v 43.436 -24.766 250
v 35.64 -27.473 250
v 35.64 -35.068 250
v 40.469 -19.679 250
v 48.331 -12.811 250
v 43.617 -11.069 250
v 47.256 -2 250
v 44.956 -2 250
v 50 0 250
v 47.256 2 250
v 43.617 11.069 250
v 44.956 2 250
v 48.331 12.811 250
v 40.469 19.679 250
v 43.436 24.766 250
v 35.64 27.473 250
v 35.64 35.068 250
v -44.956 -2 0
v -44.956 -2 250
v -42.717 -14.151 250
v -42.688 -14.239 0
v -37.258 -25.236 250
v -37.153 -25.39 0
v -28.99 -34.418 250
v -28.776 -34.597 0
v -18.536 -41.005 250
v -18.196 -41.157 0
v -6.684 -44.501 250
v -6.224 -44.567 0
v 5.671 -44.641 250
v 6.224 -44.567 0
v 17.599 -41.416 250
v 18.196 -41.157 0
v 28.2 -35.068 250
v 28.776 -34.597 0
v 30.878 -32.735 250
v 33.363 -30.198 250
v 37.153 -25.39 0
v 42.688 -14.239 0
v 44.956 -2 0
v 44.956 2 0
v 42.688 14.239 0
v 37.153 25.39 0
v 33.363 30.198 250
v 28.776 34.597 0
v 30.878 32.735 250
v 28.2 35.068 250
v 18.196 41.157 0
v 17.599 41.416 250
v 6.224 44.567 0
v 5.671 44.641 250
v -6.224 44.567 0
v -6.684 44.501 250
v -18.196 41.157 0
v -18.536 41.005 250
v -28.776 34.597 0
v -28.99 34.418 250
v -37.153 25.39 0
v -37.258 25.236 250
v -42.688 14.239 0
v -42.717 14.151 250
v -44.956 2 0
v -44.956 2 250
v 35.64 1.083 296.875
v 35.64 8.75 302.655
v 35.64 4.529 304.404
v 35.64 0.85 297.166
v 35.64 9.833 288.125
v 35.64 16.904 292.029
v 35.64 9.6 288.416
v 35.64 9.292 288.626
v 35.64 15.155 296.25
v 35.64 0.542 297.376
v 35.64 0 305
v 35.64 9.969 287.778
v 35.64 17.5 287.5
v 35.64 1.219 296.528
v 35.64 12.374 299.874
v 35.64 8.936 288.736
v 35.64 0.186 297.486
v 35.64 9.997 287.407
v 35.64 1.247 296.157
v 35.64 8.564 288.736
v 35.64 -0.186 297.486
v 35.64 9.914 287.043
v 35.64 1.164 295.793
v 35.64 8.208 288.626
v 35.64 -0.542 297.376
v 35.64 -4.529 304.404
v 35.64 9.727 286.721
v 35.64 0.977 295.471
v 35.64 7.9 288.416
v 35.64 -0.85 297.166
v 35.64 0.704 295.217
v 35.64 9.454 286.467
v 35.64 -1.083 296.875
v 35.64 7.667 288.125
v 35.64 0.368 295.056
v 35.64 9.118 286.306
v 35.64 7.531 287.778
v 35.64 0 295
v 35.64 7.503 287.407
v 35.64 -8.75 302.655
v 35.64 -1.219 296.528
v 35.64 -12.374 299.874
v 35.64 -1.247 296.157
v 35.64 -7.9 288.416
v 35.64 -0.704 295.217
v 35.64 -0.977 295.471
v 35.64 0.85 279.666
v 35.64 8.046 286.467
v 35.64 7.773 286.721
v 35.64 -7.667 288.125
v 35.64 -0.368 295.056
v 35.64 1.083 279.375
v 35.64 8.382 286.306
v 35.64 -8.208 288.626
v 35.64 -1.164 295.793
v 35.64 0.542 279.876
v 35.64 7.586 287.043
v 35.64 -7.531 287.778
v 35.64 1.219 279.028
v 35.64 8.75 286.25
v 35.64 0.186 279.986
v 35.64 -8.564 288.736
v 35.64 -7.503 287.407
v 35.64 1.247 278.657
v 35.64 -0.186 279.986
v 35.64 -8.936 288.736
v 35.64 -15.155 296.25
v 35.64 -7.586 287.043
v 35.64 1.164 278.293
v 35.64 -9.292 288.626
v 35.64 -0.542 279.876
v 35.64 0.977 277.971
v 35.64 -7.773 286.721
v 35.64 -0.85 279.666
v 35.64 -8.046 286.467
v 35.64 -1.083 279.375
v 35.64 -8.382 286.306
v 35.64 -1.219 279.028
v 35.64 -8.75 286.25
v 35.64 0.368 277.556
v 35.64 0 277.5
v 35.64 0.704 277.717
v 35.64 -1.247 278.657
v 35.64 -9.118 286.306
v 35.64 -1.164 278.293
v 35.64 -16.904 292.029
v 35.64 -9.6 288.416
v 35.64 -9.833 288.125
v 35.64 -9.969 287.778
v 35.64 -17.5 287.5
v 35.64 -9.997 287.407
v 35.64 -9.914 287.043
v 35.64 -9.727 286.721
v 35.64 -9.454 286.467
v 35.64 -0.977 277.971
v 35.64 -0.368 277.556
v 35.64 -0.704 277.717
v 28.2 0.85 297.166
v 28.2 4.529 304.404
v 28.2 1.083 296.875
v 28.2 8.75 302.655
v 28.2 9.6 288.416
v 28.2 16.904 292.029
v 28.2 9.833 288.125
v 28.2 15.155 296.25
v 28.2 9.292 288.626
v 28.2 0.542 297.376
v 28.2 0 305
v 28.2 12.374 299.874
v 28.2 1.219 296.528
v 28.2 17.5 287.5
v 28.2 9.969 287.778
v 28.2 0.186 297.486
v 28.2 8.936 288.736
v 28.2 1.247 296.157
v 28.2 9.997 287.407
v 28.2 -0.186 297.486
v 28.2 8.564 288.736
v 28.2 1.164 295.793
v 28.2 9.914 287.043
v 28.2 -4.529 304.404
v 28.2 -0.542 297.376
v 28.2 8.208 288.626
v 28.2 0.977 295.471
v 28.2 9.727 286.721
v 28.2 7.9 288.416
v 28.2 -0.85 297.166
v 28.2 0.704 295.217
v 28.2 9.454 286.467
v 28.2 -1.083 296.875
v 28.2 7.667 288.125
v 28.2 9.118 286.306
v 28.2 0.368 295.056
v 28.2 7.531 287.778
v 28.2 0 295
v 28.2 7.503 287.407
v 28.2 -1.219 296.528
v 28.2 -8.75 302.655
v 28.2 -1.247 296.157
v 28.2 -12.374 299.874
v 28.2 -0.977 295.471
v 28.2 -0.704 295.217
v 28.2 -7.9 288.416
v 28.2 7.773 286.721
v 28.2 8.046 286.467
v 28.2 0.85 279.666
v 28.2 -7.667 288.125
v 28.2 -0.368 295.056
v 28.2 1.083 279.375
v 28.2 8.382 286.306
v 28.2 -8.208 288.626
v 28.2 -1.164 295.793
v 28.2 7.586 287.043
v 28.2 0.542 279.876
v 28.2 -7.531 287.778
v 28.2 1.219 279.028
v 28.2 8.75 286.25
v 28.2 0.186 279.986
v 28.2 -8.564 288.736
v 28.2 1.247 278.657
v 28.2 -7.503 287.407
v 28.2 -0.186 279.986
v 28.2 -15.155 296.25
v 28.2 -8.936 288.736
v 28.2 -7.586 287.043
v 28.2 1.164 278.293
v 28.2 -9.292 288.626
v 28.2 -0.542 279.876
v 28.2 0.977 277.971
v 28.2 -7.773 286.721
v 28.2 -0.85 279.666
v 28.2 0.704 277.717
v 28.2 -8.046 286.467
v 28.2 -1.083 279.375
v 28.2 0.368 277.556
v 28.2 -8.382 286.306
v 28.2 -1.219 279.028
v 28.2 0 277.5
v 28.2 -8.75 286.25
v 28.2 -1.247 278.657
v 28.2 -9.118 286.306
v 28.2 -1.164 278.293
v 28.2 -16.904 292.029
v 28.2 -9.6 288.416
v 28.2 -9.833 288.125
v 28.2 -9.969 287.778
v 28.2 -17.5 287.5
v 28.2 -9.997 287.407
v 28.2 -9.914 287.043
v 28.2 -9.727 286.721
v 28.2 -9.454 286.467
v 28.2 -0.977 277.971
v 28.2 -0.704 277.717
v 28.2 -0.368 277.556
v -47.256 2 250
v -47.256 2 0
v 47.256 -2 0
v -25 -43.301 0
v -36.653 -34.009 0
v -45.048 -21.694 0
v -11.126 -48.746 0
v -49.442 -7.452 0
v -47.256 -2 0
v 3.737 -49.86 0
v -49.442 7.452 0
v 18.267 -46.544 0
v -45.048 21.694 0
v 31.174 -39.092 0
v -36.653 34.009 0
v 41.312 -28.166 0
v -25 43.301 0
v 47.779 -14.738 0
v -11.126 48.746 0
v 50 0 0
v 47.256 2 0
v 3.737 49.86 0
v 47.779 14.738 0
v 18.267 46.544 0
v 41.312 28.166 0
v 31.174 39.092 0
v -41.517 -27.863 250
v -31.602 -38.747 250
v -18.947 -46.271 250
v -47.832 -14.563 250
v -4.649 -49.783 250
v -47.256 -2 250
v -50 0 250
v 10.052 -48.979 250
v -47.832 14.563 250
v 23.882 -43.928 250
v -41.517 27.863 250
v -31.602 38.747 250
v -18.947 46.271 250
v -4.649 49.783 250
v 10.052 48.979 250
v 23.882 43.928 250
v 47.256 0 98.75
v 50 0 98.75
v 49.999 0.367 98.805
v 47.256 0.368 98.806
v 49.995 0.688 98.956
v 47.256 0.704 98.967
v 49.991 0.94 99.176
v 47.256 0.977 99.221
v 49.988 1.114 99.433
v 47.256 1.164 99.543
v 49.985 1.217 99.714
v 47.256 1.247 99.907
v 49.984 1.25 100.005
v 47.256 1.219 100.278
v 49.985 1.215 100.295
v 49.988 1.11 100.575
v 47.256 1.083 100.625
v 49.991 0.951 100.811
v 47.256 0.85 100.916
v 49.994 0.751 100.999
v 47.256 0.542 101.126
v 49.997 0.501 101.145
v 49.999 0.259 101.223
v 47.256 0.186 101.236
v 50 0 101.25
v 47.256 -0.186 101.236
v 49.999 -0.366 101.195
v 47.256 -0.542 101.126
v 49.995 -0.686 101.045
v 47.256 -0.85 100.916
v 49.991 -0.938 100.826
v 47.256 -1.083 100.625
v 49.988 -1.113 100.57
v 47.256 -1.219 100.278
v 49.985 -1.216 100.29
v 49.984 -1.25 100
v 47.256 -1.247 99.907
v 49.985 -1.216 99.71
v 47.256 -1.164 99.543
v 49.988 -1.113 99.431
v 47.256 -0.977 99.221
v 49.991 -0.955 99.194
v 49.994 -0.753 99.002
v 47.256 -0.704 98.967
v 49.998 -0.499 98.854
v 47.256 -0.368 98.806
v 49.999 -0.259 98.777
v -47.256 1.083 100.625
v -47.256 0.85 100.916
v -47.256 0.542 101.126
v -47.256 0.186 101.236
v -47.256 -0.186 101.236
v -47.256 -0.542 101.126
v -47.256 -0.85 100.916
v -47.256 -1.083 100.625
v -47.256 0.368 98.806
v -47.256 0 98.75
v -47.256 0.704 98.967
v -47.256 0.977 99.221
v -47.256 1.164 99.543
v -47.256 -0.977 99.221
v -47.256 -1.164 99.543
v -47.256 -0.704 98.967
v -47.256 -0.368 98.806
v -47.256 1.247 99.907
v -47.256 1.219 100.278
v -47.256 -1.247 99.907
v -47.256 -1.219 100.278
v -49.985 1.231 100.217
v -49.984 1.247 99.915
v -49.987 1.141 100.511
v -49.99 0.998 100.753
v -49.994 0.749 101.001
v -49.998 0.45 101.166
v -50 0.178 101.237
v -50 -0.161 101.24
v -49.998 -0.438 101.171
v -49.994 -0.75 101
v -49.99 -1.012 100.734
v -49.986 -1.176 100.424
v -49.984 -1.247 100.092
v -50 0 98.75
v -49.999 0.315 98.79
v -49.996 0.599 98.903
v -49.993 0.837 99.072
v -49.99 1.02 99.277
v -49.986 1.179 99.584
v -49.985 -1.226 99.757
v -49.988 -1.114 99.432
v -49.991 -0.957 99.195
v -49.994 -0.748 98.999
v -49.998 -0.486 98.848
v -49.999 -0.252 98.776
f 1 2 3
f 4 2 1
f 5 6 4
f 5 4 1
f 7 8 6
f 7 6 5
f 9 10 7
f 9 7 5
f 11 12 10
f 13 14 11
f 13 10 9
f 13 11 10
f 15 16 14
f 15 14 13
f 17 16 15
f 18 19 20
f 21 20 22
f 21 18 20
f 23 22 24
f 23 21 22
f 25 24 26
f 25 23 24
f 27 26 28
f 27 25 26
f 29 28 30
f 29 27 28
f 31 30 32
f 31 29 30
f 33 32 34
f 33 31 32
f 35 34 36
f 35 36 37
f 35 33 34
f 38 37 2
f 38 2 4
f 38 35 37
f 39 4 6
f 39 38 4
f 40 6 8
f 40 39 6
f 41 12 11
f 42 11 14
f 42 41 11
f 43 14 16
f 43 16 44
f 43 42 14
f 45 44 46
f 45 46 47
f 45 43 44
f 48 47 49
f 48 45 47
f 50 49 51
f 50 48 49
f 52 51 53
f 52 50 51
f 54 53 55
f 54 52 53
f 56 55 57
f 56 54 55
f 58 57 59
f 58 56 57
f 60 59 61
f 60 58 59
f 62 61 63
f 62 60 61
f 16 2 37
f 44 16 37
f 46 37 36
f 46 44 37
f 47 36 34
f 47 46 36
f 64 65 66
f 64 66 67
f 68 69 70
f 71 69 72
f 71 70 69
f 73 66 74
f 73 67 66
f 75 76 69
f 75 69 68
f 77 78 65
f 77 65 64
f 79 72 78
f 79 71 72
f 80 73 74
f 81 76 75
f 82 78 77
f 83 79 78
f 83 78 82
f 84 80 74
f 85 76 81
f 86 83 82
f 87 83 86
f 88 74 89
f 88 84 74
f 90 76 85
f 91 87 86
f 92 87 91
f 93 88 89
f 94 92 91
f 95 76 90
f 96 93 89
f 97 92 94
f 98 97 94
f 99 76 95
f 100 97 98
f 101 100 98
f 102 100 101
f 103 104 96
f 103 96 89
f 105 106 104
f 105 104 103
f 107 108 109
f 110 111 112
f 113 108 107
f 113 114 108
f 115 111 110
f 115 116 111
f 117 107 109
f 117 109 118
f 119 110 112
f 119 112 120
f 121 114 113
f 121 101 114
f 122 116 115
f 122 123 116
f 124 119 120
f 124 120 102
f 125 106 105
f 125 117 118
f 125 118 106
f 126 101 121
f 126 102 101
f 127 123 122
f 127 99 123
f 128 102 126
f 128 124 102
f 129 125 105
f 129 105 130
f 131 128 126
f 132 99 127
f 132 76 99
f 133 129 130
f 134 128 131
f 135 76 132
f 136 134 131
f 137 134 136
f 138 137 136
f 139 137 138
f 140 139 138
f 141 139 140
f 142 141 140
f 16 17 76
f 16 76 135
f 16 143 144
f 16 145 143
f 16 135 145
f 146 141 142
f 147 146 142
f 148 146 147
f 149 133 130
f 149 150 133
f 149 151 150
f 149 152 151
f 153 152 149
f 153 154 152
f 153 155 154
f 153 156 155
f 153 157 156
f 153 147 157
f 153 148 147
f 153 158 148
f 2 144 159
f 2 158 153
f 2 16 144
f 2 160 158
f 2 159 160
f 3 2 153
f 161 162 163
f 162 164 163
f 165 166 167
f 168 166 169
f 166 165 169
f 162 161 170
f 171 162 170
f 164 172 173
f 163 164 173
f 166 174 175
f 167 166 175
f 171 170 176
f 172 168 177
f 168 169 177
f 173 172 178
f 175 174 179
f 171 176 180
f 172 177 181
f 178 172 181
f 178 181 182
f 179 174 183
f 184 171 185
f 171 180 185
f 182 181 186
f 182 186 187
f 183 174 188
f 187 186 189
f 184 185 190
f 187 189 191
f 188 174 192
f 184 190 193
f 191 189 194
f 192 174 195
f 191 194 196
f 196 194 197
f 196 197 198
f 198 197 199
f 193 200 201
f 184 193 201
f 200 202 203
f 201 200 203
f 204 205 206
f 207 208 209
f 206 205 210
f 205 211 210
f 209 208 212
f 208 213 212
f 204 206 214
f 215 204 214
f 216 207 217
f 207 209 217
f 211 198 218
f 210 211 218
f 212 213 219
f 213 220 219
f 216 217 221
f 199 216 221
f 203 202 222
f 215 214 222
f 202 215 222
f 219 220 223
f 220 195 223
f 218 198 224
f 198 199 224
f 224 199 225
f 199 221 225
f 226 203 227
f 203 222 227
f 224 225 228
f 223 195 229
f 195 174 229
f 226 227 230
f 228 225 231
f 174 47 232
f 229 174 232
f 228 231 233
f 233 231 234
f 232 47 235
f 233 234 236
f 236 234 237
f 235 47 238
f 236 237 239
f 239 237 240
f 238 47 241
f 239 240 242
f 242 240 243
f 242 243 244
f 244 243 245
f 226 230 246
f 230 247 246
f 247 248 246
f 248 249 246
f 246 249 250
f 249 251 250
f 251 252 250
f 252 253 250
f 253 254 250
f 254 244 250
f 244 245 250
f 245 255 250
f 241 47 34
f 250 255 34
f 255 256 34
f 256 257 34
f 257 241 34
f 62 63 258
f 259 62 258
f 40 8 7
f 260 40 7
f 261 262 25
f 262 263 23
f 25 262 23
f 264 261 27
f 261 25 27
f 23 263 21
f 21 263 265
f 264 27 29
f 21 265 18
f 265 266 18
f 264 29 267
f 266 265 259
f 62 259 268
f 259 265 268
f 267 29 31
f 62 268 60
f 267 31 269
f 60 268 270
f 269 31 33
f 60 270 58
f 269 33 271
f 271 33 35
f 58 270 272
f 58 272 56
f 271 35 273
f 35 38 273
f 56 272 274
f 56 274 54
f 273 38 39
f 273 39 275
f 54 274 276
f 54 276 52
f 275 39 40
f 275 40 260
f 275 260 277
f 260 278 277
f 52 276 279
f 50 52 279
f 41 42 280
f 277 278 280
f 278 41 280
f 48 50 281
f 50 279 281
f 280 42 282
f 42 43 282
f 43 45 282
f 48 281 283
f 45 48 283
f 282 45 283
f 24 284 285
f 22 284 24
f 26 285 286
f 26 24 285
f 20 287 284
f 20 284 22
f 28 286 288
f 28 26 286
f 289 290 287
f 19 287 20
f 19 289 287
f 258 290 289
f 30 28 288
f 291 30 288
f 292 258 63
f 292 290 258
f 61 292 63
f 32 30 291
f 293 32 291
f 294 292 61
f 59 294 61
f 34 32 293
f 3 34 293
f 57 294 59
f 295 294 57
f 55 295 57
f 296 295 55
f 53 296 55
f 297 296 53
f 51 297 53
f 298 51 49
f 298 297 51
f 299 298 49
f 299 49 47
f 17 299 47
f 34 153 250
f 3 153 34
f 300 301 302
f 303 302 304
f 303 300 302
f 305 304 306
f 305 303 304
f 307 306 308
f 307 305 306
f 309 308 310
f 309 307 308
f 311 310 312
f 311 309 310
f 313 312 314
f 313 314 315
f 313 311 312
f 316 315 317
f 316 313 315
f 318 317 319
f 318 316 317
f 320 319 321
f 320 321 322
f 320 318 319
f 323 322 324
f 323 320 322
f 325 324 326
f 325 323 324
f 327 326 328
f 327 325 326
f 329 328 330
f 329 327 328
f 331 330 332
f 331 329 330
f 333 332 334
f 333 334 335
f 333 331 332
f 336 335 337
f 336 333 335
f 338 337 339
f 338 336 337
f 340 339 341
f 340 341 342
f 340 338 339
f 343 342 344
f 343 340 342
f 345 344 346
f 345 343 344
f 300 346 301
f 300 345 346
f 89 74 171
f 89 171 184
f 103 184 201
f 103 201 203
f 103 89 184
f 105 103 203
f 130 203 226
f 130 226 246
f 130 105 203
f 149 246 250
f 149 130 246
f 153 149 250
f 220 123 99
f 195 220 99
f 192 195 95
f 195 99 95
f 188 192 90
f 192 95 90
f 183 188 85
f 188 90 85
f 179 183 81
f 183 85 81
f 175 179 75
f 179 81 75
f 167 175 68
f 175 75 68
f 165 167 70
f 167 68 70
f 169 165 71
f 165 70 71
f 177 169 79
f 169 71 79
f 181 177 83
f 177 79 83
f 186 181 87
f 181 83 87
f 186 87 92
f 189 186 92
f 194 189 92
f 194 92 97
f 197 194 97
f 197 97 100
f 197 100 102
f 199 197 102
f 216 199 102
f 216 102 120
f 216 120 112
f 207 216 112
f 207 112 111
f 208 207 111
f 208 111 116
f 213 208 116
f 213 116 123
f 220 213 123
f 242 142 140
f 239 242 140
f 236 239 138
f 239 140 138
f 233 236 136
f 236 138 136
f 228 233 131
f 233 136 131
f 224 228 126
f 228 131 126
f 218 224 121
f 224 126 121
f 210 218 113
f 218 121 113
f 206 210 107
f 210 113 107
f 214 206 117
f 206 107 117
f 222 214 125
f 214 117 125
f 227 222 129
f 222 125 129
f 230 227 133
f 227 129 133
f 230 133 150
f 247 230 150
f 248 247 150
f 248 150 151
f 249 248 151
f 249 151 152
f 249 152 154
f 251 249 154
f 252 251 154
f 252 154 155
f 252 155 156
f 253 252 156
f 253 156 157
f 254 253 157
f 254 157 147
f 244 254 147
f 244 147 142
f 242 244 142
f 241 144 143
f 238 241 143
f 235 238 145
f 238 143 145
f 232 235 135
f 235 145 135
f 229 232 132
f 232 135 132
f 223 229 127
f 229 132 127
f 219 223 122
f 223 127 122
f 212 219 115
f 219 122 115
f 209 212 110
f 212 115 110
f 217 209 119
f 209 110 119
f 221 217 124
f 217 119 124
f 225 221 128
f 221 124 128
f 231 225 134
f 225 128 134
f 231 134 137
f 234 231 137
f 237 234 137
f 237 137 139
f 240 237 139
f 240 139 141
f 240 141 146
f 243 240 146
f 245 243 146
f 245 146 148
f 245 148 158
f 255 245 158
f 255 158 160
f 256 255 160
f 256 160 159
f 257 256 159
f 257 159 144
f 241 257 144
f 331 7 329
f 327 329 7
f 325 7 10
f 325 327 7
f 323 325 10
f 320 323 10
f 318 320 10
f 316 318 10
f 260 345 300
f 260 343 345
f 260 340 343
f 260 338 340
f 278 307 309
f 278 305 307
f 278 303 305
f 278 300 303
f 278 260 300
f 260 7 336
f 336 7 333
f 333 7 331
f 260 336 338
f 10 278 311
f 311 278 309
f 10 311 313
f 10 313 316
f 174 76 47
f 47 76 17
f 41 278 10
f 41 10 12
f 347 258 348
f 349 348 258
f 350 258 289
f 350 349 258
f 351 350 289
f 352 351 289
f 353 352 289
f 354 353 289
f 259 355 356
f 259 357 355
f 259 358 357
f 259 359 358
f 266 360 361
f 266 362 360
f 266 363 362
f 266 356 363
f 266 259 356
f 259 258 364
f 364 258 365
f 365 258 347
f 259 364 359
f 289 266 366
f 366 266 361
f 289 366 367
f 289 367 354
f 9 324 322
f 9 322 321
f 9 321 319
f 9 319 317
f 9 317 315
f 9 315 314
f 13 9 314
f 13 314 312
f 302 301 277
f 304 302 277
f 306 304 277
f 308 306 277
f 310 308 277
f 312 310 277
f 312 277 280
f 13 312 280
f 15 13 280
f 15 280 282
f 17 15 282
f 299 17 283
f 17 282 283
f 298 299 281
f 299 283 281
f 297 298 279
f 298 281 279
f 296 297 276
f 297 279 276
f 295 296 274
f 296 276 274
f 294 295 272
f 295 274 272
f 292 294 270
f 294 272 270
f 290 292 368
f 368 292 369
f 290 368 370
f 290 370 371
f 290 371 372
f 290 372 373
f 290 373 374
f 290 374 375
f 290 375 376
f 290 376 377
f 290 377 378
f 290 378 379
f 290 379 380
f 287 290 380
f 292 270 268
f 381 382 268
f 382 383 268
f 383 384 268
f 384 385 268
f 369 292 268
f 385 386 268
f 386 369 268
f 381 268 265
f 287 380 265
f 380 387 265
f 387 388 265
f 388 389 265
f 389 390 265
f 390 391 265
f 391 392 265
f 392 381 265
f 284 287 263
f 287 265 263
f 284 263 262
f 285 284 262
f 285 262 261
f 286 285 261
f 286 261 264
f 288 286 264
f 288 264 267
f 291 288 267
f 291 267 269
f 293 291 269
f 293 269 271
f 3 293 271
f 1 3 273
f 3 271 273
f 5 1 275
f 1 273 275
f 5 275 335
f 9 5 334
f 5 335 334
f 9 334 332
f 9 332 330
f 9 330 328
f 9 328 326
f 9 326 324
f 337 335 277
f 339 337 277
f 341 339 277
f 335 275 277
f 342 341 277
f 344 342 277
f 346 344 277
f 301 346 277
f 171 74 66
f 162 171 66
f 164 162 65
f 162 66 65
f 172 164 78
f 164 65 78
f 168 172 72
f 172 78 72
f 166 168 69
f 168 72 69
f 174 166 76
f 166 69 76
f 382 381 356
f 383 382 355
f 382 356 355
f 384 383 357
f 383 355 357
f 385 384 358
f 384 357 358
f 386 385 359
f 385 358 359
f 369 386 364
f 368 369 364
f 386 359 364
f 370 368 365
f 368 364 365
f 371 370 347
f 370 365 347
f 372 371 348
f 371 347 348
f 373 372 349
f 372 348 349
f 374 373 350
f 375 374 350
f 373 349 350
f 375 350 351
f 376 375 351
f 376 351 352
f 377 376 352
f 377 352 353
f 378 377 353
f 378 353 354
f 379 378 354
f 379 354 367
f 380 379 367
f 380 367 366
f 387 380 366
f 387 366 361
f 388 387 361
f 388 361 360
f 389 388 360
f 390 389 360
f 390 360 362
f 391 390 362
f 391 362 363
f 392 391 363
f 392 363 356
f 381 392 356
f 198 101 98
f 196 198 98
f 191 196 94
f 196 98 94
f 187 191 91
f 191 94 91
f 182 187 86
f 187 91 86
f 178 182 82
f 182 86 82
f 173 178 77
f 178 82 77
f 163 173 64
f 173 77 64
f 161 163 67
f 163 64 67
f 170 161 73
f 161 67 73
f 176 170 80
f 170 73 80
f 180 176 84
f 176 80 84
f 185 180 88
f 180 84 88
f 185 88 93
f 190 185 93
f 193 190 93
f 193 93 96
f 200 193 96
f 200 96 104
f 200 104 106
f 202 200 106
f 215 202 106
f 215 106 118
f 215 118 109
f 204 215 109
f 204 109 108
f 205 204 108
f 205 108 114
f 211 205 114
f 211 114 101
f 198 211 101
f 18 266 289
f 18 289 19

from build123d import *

# Parameters (mm, degrees)
SKETCH1_R               = 50
BOSS_EXTRUDE1_DEPTH     = 250
BOSS_EXTRUDE2_DEPTH     = 55
SKETCH7_R               = 1.25
CUT_EXTRUDE4_DEPTH      = 75
CUT_EXTRUDE4_DEPTH_BACK = 96
CUT_EXTRUDE5_DEPTH      = 96
CUT_EXTRUDE6_DEPTH      = 96
SKETCH10_R              = 1.25
CUT_EXTRUDE7_DEPTH      = 96


with BuildPart() as part:
    # Sketch1 → Boss-Extrude1 (new body)
    with BuildSketch(Plane.XY):
        Circle(SKETCH1_R)
        with BuildLine():
            Line((-44.955555556, 1.999506112), (-47.255555556, 1.999506112))
            Line((-47.255555556, 1.999506112), (-47.255555556, -1.999506112))
            Line((-47.255555556, -1.999506112), (-44.955555556, -1.999506112))
            ThreePointArc((-44.955555556, -1.999506112), (0, -45), (44.955555556, -1.999506112))
            Line((44.955555556, -1.999506112), (47.255555556, -1.999506112))
            Line((47.255555556, -1.999506112), (47.255555556, 1.999506112))
            Line((47.255555556, 1.999506112), (44.955555556, 1.999506112))
            ThreePointArc((44.955555556, 1.999506112), (0, 45), (-44.955555556, 1.999506112))
        make_face(mode=Mode.SUBTRACT)
    extrude(amount=BOSS_EXTRUDE1_DEPTH)

    # Sketch3 → Boss-Extrude2 (add)
    with BuildSketch(Plane.XY.offset(250)):
        Polygon((28.2, 0), (28.2, 35.067934071), (35.640426485, 35.067934071), (35.640426485, -35.067934071), (28.2, -35.067934071), align=None)
    extrude(amount=BOSS_EXTRUDE2_DEPTH)

    # Sketch7 → Cut-Extrude4 (cut, two sides)
    with BuildSketch(Plane(origin=(35.640426485, 0, 0), x_dir=(0, 0, -1), z_dir=(1, 0, 0))) as cut_extrude4_sk:
        with Locations((-100, 0)):
            Circle(SKETCH7_R)
    extrude(amount=CUT_EXTRUDE4_DEPTH, mode=Mode.SUBTRACT)
    extrude(cut_extrude4_sk.sketch, amount=-CUT_EXTRUDE4_DEPTH_BACK, mode=Mode.SUBTRACT)

    # Sketch8 → Cut-Extrude5 (cut)
    with BuildSketch(Plane(origin=(35.640426485, 0, 0), x_dir=(0, 0, -1), z_dir=(1, 0, 0))):
        with BuildLine():
            Line((-287.5, 17.5), (-250, 35.067934071))
            Line((-250, 35.067934071), (-305, 35.067934071))
            Line((-305, 35.067934071), (-305, 0))
            ThreePointArc((-305, 0), (-299.874368671, 12.374368671), (-287.5, 17.5))
        make_face()
    extrude(amount=-CUT_EXTRUDE5_DEPTH, mode=Mode.SUBTRACT)

    # Sketch9 → Cut-Extrude6 (cut)
    with BuildSketch(Plane(origin=(35.640426485, 0, 0), x_dir=(0, 0, -1), z_dir=(1, 0, 0))):
        with BuildLine():
            Line((-287.5, -17.5), (-250, -35.067934071))
            Line((-250, -35.067934071), (-305, -35.067934071))
            Line((-305, -35.067934071), (-305, 0))
            ThreePointArc((-305, 0), (-299.874368671, -12.374368671), (-287.5, -17.5))
        make_face()
    extrude(amount=-CUT_EXTRUDE6_DEPTH, mode=Mode.SUBTRACT)

    # Sketch10 → Cut-Extrude7 (cut)
    with BuildSketch(Plane(origin=(35.640426485, 0, 0), x_dir=(0, 0, -1), z_dir=(1, 0, 0))):
        with Locations((-296.25, 0)):
            Circle(SKETCH10_R)
        with Locations((-287.5, 8.75)):
            Circle(SKETCH10_R)
        with Locations((-278.75, 0)):
            Circle(SKETCH10_R)
        with Locations((-287.5, -8.75)):
            Circle(SKETCH10_R)
    extrude(amount=-CUT_EXTRUDE7_DEPTH, mode=Mode.SUBTRACT)


solid = part.part
